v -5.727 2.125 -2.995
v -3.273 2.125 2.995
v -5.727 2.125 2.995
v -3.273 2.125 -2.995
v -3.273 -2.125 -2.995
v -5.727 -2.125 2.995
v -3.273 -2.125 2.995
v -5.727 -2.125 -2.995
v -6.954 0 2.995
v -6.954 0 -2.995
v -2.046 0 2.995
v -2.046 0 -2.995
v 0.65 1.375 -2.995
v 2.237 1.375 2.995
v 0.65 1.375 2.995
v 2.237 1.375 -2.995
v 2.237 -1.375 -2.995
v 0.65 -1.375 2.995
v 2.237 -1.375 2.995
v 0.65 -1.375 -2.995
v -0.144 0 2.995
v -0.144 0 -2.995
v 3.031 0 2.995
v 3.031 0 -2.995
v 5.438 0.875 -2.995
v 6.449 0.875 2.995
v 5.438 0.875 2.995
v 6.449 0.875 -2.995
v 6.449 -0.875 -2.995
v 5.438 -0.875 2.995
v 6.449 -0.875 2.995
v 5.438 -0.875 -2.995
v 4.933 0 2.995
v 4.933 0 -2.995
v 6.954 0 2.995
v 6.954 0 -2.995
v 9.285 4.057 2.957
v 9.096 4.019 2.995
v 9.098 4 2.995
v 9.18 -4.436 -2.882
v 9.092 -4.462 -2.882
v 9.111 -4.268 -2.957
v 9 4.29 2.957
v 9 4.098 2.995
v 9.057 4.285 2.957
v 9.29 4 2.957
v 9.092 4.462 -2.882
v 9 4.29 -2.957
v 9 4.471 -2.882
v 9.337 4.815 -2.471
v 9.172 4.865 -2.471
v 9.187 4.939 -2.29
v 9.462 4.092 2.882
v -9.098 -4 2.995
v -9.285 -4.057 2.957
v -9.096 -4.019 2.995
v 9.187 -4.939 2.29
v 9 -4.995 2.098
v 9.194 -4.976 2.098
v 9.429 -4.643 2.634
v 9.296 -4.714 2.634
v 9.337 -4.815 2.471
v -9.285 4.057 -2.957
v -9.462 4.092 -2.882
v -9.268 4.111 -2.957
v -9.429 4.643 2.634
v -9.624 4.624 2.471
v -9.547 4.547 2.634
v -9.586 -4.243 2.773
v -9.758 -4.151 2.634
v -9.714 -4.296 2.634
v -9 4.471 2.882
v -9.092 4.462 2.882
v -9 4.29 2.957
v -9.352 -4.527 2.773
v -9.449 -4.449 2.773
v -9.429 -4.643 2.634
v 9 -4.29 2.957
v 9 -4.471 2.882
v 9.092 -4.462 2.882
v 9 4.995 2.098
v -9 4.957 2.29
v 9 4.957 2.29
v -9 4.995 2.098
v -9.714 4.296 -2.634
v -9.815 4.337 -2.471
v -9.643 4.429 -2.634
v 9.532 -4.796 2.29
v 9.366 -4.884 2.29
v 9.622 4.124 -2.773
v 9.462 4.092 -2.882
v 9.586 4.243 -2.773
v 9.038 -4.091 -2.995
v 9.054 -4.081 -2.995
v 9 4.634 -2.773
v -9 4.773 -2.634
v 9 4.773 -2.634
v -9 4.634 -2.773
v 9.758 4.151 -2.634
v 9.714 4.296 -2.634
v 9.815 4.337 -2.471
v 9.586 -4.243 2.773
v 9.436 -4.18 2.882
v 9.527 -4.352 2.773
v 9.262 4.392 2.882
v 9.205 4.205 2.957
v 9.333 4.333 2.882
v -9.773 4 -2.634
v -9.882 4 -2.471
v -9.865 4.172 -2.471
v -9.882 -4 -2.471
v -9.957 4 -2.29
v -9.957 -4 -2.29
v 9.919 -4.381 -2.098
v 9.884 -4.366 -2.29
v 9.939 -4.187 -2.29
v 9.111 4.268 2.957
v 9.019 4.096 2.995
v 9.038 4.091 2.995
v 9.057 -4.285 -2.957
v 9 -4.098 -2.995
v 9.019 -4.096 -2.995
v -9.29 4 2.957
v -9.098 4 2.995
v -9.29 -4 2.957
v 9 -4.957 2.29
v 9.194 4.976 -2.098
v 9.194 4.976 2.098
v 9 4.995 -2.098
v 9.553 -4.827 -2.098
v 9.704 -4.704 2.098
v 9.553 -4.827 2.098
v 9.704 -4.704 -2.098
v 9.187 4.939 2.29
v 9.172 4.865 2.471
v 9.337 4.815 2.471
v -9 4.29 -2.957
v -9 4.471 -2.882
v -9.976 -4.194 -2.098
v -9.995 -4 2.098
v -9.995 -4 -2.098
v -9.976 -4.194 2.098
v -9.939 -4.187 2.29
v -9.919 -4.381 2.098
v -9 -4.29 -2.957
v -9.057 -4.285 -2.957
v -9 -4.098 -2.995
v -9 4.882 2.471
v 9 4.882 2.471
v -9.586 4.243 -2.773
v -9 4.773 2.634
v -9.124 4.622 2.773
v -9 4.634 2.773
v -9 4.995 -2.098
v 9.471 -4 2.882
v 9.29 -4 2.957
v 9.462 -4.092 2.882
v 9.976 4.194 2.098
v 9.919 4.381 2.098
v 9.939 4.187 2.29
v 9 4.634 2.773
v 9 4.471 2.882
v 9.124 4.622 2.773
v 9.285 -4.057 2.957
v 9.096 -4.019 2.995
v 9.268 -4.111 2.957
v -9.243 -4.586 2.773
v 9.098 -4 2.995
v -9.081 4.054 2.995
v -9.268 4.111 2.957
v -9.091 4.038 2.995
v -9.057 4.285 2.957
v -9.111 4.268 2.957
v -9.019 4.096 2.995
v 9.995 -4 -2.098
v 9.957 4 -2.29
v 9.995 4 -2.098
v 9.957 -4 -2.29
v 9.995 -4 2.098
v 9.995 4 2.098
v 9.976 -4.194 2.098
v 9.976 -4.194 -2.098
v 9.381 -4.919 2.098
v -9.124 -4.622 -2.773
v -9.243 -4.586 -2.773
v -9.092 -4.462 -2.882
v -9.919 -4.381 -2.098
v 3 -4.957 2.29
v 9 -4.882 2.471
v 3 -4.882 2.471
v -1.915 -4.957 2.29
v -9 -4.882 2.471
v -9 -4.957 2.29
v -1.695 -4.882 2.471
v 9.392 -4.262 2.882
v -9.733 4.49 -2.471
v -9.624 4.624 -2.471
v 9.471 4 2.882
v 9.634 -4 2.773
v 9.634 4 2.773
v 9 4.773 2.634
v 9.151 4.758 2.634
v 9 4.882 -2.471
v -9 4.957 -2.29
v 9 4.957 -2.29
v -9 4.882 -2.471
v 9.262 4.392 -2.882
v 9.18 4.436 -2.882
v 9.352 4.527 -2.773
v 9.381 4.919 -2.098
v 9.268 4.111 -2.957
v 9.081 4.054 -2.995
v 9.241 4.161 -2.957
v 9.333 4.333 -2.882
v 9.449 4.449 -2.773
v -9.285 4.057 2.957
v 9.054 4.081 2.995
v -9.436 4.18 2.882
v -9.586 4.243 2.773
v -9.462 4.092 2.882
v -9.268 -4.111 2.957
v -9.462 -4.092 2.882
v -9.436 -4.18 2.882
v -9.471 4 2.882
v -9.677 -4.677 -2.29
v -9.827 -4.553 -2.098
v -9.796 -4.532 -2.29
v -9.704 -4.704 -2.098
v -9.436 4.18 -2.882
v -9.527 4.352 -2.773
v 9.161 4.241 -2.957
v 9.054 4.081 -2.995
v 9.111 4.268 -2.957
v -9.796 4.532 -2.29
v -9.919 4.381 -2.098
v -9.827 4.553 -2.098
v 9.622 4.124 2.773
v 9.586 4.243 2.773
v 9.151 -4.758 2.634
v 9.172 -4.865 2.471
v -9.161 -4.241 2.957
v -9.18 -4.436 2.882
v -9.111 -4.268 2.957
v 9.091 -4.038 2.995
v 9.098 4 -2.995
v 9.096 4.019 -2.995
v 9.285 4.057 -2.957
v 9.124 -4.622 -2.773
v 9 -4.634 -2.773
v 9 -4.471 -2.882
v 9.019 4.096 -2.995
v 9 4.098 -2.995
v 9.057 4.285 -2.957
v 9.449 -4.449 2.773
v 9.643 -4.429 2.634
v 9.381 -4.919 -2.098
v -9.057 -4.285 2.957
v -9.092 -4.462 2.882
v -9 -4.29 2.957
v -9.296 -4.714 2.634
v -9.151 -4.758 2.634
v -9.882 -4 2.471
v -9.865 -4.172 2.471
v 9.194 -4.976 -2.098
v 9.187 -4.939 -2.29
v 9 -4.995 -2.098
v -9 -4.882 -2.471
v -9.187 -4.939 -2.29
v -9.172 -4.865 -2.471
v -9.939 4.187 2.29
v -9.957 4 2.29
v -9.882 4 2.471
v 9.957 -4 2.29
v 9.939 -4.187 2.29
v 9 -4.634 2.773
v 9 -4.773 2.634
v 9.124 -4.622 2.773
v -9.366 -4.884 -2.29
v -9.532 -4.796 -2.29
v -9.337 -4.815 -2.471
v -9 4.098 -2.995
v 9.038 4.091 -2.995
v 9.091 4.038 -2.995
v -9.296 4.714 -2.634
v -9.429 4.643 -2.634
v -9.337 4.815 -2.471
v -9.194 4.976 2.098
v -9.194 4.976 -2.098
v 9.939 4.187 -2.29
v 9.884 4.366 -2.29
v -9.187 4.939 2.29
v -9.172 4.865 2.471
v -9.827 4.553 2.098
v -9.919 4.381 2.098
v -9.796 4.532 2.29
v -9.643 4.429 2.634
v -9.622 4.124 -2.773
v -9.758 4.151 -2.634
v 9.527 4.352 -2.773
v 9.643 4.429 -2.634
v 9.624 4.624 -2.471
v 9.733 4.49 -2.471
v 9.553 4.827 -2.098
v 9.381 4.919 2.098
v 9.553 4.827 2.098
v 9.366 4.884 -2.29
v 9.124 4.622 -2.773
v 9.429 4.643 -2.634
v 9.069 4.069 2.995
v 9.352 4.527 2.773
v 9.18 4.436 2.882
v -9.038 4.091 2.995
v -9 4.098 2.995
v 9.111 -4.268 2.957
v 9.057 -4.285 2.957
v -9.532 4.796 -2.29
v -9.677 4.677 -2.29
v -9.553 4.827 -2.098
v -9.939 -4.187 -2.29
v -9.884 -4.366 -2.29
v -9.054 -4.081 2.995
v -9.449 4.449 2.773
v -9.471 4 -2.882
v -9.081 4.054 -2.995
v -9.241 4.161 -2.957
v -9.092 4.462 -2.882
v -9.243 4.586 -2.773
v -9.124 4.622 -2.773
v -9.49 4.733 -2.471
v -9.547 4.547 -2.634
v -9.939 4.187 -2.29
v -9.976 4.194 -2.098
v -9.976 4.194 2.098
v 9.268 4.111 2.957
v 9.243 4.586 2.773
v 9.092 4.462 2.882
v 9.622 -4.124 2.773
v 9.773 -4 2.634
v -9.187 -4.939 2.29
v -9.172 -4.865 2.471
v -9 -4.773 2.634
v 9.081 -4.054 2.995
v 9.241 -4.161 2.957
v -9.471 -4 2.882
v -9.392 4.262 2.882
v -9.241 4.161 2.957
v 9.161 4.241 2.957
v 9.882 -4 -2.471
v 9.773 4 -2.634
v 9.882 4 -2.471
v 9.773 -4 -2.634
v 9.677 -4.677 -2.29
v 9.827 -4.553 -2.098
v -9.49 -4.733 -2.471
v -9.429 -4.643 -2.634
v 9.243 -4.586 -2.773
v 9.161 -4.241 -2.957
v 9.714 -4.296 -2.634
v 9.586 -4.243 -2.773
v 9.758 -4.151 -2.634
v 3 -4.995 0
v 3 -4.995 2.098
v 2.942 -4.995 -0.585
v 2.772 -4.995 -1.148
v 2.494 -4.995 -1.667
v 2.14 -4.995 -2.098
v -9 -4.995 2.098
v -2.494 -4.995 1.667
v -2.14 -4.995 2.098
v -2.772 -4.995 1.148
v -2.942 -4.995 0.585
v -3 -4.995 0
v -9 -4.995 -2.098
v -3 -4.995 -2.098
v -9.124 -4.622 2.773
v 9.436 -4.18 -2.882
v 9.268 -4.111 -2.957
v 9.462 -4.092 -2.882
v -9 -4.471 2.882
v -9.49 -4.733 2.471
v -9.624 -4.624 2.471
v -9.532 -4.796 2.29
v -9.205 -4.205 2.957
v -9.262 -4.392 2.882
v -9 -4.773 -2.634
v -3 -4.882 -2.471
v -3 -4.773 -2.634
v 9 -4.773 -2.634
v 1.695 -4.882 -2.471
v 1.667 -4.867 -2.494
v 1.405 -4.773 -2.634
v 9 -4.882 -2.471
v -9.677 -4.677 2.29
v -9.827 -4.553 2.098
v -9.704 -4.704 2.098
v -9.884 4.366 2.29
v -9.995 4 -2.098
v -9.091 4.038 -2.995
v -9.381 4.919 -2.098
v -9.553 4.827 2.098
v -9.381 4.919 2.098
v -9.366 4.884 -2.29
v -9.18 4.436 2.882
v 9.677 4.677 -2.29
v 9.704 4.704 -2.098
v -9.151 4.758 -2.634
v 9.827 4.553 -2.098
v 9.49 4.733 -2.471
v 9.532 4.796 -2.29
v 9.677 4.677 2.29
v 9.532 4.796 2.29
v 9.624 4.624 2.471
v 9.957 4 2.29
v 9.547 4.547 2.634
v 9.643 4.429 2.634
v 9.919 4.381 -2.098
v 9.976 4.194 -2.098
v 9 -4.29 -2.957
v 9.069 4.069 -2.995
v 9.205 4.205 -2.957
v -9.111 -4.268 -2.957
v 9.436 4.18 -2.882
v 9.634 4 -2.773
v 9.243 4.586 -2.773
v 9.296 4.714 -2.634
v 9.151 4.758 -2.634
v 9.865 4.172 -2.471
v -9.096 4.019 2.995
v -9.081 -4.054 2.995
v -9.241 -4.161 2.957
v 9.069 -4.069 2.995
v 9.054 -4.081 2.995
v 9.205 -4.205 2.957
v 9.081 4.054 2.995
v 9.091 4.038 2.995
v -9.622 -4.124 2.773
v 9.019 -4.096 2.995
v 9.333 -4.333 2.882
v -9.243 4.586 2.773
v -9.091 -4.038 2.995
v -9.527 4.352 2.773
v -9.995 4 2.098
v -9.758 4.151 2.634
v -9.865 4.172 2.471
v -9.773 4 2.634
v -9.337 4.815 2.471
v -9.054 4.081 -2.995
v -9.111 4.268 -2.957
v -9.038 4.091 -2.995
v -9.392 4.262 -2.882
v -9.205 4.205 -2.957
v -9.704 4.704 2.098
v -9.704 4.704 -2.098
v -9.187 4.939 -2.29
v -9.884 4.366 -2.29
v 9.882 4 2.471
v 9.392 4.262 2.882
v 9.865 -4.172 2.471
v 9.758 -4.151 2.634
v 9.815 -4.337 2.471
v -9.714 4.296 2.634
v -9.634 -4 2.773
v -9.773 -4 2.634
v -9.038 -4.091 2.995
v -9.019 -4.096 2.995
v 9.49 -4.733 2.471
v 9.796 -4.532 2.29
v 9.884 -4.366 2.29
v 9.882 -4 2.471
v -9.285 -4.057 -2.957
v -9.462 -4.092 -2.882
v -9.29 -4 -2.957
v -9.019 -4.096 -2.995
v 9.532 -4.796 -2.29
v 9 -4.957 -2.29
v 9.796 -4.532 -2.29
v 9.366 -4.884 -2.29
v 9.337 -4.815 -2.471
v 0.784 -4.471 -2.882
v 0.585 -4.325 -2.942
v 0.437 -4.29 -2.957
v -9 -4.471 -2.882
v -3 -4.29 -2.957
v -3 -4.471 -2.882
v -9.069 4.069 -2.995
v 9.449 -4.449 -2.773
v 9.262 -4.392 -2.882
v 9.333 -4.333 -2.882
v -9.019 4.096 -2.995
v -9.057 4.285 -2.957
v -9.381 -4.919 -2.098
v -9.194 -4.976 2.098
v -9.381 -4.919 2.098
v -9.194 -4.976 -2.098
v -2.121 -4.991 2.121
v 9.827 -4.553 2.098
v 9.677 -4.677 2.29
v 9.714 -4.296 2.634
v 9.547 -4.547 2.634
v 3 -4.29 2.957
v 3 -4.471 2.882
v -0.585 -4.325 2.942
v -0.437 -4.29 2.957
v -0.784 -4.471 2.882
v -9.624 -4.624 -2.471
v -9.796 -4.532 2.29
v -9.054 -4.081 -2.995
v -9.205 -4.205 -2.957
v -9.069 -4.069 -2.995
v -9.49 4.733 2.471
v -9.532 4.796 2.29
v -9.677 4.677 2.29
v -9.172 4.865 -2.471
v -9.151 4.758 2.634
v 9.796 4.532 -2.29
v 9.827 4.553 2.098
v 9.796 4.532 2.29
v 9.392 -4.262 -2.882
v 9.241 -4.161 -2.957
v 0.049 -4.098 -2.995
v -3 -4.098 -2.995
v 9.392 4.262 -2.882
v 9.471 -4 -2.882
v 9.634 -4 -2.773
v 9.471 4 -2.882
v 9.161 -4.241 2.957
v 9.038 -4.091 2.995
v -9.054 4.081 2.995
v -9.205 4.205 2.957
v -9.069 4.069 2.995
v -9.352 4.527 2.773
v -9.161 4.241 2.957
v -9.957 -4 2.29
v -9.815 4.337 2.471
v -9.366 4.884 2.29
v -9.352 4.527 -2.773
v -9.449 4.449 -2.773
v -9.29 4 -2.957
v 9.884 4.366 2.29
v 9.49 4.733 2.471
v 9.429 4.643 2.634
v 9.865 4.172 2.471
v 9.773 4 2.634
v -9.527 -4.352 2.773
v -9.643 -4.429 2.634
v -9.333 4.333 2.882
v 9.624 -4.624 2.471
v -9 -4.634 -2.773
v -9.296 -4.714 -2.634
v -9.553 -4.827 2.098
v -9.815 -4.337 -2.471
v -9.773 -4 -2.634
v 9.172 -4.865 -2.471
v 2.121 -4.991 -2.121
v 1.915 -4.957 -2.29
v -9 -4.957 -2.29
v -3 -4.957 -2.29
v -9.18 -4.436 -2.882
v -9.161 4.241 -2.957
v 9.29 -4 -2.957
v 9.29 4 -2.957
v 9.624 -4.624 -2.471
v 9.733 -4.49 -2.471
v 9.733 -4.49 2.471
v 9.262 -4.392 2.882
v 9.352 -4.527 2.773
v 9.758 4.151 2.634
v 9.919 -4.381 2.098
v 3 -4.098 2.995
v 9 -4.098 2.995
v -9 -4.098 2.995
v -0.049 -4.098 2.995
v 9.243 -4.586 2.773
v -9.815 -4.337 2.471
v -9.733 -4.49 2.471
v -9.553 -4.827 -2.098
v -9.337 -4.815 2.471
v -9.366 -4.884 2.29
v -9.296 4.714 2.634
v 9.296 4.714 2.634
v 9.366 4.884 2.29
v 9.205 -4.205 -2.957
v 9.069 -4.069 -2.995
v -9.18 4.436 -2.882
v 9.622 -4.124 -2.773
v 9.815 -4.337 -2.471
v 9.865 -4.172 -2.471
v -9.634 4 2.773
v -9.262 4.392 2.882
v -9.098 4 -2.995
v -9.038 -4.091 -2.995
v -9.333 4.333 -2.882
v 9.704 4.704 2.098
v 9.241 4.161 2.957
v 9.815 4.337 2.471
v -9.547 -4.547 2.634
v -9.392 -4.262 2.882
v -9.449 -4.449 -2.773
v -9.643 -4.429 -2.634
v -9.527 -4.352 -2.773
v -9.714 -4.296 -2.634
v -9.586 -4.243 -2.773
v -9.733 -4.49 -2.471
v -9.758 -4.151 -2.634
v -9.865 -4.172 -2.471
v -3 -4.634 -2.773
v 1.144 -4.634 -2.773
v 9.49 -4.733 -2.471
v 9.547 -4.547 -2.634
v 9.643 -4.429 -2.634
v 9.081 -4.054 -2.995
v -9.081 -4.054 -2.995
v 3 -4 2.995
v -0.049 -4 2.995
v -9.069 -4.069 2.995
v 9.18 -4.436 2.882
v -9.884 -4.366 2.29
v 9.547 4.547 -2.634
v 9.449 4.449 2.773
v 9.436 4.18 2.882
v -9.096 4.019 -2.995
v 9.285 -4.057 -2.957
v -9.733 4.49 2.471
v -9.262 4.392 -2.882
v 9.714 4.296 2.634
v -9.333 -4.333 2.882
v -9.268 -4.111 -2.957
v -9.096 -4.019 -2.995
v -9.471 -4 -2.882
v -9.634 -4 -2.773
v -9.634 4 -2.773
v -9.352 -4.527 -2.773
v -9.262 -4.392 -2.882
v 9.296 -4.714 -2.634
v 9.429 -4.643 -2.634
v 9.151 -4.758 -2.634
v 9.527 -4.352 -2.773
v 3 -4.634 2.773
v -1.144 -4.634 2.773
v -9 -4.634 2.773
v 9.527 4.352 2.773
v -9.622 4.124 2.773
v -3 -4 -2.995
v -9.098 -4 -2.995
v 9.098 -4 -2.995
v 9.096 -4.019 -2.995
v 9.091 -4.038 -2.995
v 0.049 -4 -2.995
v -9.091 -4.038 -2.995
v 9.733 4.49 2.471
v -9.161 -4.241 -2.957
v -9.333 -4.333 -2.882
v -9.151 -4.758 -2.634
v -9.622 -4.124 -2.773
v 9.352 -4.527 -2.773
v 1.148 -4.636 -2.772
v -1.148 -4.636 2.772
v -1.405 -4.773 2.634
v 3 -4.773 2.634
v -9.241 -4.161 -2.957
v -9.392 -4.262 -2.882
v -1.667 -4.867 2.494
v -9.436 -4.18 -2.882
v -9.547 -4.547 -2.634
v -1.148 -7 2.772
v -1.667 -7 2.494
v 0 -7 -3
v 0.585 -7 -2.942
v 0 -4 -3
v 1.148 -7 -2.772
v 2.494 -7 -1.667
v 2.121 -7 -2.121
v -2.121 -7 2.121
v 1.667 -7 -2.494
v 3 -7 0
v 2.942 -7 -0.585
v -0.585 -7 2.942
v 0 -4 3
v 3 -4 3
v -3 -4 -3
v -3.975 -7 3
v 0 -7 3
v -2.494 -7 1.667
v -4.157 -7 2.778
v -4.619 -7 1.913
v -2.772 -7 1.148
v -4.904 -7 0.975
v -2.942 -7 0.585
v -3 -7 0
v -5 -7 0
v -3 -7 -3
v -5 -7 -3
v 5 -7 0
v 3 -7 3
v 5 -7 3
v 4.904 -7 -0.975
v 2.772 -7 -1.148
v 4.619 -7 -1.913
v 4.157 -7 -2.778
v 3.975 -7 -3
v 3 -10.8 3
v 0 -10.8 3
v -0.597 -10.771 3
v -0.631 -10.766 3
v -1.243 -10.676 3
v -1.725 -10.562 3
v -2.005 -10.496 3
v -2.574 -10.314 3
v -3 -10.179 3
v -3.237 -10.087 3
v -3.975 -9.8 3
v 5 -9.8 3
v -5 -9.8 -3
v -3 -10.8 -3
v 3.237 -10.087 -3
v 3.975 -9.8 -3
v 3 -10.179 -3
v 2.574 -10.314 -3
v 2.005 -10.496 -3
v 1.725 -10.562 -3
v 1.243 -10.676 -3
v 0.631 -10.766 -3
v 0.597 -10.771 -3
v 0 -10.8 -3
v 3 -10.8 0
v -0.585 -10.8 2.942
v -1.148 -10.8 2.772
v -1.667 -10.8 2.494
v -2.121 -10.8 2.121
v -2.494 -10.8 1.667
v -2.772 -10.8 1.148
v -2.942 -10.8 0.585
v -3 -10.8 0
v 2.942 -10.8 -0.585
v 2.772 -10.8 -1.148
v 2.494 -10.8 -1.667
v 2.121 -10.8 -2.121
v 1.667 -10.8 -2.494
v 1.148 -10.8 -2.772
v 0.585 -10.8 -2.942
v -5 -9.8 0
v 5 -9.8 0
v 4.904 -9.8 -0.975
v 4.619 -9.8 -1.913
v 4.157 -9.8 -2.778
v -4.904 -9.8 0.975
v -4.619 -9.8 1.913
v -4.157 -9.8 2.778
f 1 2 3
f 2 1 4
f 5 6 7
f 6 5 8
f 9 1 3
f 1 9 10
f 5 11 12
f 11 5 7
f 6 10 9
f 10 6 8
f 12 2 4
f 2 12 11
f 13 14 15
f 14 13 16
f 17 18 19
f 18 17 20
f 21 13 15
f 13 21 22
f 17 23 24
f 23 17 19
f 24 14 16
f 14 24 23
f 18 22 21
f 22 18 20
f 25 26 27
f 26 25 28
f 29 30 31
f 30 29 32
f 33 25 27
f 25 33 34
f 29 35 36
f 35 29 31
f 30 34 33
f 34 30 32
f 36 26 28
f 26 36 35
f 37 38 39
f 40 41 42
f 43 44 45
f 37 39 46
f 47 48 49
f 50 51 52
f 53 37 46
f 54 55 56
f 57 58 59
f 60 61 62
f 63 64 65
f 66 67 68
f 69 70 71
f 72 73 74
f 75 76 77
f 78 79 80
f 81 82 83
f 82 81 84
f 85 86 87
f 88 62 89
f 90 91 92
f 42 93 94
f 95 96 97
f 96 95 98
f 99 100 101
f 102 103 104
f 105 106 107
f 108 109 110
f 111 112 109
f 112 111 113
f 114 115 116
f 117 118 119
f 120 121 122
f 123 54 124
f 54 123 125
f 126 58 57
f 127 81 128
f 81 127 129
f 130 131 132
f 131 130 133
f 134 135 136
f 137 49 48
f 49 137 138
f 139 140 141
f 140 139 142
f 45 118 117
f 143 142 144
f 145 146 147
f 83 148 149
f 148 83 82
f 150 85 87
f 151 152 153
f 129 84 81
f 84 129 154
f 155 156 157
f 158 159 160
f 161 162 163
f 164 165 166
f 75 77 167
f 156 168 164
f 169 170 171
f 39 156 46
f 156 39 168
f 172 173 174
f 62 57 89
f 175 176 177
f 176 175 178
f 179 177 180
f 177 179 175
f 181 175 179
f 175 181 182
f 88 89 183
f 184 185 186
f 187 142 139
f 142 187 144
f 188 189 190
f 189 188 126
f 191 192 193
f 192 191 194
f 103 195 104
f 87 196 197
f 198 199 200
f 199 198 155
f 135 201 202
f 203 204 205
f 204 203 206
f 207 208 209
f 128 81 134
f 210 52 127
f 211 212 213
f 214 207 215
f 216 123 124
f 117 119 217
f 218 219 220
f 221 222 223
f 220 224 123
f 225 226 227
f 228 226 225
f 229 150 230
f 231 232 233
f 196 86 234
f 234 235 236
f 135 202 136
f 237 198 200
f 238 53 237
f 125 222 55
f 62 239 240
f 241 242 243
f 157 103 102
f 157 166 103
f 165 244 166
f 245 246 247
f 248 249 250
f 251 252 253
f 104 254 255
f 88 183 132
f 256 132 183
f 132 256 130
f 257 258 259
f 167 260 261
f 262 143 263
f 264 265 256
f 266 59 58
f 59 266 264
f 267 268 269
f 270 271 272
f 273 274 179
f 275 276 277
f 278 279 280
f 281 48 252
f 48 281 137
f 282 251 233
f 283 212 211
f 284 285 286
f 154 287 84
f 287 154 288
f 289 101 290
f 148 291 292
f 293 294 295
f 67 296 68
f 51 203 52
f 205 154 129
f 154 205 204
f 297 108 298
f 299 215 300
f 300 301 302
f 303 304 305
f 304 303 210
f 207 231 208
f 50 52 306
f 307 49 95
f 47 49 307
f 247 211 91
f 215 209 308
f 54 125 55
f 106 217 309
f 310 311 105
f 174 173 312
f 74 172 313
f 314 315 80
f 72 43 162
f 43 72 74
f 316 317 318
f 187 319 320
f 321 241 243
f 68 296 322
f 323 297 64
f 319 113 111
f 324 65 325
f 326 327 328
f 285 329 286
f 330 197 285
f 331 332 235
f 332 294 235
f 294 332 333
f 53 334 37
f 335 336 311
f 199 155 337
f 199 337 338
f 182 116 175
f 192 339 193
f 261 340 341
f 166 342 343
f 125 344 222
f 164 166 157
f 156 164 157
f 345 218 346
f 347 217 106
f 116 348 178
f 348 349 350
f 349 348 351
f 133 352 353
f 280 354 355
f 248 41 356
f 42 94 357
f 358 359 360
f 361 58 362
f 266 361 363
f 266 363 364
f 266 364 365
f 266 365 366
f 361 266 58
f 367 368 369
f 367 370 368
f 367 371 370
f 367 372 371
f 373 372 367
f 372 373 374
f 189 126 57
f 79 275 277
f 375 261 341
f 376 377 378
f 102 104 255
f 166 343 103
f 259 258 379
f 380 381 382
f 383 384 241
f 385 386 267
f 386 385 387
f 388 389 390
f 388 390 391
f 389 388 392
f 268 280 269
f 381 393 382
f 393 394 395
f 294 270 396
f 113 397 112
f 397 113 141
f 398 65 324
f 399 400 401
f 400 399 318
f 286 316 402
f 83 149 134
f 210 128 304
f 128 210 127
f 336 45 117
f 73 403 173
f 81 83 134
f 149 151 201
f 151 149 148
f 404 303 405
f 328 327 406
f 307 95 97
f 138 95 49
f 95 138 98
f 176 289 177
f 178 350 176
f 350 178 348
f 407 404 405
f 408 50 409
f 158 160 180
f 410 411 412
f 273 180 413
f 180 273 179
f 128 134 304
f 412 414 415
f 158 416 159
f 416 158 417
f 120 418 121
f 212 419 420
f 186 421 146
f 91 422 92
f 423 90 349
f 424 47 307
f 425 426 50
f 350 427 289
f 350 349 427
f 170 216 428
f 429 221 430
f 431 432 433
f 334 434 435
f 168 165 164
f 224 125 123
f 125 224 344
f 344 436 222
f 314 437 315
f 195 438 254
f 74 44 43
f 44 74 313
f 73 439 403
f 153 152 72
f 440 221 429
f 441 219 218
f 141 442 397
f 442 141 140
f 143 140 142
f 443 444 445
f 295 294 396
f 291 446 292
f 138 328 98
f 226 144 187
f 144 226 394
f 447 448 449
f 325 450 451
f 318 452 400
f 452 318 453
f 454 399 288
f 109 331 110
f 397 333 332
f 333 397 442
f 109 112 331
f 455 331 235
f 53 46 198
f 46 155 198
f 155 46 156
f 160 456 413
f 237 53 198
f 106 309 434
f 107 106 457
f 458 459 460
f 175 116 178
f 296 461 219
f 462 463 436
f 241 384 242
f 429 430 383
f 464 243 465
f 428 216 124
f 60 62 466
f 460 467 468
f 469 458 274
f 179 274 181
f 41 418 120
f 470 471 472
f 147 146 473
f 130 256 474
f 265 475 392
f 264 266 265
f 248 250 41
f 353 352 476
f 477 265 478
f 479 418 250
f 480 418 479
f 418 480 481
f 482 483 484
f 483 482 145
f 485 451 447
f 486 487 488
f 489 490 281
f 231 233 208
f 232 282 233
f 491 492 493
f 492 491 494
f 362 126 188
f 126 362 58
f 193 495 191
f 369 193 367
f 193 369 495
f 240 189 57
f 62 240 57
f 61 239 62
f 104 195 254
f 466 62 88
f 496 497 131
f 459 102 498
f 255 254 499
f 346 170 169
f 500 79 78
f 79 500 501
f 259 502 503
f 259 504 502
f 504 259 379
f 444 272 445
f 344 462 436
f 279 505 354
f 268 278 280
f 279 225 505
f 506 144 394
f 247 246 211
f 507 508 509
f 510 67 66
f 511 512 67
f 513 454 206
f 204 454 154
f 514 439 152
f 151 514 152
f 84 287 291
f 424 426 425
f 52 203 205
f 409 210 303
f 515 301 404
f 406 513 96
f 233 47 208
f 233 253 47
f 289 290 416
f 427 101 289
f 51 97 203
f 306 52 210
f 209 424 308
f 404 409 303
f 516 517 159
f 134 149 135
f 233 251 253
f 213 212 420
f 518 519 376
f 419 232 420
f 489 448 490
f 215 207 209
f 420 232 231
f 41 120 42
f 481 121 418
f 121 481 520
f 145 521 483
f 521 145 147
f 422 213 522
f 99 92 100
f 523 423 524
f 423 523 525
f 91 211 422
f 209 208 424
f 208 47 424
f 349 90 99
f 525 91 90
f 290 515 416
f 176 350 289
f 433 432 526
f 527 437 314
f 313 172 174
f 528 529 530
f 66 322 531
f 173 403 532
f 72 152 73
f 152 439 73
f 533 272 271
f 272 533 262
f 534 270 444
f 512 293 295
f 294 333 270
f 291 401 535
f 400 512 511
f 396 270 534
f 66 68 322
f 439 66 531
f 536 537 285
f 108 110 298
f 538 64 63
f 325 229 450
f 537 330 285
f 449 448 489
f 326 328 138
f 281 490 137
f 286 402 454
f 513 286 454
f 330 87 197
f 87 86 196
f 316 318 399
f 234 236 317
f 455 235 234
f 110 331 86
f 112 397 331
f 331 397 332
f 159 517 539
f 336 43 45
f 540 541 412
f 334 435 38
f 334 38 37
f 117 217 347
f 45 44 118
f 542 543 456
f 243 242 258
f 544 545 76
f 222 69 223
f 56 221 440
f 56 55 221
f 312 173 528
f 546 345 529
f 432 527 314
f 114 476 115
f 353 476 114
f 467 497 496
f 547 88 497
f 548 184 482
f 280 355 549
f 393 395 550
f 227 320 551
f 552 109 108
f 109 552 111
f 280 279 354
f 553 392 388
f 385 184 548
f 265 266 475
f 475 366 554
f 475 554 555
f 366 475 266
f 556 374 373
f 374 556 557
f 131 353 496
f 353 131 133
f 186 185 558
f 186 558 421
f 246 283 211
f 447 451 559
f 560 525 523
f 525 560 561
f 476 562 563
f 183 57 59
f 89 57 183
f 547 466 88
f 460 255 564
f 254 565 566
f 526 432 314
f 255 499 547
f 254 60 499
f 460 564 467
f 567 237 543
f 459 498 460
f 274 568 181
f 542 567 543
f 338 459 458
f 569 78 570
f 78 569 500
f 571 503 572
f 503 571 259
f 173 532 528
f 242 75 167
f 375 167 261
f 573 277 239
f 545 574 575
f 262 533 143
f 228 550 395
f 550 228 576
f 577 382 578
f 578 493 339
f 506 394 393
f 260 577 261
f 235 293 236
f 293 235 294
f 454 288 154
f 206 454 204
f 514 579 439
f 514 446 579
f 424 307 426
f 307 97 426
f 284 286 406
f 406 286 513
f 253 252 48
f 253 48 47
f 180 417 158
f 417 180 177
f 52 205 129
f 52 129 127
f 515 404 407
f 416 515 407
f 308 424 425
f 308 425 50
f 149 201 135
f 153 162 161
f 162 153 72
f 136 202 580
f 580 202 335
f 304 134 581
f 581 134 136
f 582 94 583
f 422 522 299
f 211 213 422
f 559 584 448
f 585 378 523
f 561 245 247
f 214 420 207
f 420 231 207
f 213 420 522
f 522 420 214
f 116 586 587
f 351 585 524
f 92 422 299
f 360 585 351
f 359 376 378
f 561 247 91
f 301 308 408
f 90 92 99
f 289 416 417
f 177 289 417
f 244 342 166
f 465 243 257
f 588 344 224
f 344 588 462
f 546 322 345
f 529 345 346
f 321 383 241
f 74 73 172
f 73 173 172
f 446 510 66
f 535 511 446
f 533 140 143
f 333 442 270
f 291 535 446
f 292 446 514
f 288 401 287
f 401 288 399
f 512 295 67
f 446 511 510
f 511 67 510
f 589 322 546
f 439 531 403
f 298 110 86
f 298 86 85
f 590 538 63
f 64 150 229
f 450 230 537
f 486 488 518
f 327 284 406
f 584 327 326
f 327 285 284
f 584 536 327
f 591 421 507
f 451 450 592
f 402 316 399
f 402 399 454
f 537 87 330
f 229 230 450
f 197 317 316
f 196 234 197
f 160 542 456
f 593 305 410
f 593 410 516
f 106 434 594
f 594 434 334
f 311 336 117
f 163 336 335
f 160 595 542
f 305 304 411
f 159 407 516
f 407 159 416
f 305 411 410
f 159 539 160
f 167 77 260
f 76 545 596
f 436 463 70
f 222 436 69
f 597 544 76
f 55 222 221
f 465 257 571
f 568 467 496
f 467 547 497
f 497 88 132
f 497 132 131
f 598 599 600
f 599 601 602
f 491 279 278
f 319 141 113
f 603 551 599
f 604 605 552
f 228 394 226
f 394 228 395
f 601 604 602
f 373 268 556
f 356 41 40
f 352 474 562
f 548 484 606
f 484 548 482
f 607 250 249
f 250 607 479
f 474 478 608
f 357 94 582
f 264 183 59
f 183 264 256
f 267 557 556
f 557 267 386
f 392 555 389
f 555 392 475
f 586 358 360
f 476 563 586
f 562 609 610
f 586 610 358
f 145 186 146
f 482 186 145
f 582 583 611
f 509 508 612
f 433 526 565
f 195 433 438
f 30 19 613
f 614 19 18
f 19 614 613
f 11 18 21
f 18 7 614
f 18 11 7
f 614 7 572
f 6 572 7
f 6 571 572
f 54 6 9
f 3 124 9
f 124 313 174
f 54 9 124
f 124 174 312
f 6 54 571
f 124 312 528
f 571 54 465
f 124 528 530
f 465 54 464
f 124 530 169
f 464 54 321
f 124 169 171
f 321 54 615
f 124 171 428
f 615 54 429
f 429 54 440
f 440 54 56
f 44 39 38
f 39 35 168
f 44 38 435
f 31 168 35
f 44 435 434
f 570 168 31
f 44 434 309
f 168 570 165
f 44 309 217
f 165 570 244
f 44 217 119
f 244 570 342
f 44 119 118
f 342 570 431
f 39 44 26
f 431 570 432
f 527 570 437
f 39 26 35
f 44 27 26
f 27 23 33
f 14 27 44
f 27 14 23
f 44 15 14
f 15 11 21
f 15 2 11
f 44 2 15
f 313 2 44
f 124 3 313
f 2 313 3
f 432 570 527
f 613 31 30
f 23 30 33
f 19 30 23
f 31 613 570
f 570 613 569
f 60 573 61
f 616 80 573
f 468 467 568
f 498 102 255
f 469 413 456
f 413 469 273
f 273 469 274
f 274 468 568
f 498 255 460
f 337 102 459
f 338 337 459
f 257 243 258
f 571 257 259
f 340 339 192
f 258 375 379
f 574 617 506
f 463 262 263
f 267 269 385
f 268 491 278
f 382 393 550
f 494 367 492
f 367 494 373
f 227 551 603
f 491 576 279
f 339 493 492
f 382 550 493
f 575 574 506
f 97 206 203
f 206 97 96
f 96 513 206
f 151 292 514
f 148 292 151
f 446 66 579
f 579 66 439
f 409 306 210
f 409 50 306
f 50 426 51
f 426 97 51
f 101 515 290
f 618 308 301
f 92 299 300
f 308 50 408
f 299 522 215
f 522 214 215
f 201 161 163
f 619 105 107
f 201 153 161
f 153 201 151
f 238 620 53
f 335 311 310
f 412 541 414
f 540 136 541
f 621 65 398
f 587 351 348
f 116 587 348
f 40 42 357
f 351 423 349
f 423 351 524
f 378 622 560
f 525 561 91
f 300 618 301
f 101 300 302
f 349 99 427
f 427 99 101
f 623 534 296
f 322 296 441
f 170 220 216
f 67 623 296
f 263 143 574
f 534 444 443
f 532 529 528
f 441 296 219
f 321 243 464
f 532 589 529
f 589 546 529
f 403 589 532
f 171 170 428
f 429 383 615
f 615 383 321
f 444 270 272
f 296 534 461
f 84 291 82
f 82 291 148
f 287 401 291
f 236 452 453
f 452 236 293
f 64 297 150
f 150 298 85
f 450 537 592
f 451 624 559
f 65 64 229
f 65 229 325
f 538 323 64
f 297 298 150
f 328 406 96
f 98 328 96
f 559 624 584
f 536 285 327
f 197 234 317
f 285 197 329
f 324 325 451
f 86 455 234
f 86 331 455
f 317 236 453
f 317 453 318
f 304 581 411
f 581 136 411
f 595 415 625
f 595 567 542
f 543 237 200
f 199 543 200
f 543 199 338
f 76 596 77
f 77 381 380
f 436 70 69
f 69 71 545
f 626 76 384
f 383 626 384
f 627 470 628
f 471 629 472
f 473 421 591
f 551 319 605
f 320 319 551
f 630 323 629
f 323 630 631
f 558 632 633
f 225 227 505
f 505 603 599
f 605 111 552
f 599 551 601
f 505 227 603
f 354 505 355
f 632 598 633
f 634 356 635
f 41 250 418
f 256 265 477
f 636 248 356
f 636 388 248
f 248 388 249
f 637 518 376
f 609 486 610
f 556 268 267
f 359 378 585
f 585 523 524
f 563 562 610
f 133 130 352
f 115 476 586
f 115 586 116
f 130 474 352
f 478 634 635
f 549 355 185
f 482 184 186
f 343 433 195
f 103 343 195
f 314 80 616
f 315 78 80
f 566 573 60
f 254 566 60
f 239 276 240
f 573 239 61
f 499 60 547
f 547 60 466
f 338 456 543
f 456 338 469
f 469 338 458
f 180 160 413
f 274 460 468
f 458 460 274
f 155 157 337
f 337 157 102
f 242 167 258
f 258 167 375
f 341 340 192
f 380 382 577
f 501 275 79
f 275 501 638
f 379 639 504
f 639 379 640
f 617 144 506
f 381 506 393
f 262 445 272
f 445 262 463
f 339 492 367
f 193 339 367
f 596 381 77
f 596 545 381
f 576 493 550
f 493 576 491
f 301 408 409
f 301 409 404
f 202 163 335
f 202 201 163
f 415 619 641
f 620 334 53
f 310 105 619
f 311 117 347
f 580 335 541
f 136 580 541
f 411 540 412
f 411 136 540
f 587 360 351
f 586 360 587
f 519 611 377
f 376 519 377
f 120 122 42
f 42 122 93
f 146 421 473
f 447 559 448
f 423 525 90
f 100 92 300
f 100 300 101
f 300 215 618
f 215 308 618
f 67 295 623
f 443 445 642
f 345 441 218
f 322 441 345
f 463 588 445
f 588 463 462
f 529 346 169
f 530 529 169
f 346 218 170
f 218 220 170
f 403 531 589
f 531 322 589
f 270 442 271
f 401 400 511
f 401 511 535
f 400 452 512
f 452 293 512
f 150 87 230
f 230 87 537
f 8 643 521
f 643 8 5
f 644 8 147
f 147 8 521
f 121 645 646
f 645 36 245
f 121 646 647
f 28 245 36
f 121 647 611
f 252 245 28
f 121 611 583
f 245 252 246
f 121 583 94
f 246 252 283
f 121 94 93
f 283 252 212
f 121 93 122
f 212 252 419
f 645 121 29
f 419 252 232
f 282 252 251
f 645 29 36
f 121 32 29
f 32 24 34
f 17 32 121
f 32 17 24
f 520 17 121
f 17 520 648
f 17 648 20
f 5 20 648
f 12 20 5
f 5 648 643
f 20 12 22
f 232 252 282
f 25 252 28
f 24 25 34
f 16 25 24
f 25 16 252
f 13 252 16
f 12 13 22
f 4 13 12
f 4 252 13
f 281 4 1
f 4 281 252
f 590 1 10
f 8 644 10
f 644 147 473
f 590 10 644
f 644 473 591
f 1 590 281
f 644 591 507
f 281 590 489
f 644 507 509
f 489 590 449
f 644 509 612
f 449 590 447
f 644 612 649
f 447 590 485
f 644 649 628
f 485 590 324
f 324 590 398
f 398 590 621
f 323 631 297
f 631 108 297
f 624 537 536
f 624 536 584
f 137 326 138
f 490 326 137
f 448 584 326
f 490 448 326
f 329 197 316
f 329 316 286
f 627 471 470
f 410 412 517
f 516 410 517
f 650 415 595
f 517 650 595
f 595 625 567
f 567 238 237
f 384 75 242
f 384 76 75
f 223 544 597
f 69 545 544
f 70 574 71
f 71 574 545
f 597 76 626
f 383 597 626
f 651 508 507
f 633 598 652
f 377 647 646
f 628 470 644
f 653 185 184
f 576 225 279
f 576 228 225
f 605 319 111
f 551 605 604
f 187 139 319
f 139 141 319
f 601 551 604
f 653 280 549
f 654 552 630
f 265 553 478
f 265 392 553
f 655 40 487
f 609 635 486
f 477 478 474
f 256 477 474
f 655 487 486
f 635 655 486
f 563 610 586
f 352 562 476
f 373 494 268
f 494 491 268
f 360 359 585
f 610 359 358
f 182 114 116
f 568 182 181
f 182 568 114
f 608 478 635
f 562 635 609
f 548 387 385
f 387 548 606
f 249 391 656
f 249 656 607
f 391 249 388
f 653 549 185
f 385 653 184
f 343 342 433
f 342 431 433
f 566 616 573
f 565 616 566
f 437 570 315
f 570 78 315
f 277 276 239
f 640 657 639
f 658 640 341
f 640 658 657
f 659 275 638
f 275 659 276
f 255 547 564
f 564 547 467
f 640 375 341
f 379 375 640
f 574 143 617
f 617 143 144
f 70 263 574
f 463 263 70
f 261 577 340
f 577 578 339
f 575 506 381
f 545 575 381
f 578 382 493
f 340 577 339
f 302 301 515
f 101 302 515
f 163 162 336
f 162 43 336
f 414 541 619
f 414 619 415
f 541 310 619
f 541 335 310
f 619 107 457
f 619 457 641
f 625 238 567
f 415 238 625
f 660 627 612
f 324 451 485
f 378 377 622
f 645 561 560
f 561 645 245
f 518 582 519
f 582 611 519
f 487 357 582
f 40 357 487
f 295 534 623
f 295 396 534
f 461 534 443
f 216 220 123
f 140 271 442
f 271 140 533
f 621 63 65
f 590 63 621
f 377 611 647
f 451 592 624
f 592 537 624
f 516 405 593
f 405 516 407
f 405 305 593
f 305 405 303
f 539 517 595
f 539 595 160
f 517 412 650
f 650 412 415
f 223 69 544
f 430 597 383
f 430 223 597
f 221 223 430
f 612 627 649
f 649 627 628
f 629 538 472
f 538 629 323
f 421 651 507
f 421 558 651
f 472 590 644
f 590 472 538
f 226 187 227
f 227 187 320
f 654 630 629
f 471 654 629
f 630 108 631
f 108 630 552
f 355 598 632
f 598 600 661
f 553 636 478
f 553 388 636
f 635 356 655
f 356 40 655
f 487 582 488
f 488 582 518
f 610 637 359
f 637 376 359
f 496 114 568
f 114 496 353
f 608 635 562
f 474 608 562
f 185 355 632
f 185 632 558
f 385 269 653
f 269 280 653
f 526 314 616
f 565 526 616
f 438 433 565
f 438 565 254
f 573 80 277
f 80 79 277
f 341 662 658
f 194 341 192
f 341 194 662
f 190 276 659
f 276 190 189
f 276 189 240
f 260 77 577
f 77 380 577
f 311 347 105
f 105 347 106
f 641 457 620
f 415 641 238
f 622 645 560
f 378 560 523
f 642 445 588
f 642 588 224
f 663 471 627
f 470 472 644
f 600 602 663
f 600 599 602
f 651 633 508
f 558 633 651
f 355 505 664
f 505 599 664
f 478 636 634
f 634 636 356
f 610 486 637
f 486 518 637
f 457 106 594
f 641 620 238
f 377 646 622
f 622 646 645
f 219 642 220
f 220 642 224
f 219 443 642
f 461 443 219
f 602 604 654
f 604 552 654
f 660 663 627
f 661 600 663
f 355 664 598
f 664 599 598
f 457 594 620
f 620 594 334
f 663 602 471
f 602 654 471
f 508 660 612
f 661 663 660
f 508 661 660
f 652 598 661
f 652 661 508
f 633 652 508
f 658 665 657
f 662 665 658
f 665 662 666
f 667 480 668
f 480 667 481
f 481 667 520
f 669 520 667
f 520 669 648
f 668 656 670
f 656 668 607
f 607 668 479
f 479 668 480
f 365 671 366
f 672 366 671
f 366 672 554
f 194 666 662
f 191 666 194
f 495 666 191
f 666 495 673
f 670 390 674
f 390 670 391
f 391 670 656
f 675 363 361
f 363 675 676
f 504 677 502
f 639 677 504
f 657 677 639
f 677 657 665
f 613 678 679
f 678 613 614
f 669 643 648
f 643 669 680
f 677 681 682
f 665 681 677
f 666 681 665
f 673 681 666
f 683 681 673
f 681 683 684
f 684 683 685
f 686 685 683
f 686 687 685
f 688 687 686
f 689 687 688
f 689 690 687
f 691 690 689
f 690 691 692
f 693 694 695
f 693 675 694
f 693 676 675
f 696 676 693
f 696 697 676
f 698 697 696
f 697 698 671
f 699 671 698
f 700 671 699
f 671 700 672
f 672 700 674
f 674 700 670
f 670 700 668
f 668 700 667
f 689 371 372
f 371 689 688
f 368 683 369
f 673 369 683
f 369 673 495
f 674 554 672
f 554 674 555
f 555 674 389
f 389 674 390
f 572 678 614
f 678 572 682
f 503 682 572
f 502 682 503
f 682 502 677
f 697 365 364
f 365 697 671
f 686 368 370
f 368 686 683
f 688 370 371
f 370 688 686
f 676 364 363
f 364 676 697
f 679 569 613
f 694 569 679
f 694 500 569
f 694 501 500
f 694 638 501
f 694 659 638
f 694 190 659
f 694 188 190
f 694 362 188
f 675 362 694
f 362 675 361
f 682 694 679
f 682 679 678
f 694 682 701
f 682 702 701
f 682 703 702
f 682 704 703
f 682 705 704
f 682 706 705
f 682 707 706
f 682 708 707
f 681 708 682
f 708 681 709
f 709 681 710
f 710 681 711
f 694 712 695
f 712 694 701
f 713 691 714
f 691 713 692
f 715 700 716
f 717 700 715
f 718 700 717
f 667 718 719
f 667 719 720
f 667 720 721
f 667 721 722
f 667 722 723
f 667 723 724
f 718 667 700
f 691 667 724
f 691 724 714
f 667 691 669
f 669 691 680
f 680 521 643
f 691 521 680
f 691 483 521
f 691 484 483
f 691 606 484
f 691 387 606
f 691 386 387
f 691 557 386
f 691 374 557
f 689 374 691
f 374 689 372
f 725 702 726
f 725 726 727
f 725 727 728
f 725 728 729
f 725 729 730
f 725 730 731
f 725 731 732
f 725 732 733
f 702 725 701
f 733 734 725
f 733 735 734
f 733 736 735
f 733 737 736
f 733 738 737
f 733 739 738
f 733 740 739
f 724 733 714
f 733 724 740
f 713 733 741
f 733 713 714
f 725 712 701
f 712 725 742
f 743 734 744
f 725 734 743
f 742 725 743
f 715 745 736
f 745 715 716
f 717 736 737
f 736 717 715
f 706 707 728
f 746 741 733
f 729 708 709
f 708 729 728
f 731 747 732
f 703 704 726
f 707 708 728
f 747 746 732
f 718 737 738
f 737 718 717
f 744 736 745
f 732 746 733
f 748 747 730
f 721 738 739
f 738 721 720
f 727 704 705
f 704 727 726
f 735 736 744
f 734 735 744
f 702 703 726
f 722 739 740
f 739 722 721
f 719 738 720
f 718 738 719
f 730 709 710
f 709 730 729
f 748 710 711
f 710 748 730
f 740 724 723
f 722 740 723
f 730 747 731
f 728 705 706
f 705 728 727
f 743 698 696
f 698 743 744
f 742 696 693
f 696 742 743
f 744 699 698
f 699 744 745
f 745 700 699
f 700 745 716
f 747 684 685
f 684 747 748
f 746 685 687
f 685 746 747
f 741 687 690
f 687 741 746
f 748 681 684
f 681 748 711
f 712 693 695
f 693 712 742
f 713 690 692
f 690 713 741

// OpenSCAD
// Customizable hex key holder

// diameter for key #1
hex1 = 4; // [1.5:0.5:5]

// diameter for key #2 
hex2 = 2.5; //[1.5:0.5:5]

// diameter for key #3
hex3 = 1.5; //[1.5:0.5:5]

// tolerance for the print
tolerance = 0.25;

/*[Hidden]*/
$fn=32;


// Lets build it
block();

module hexHole(h){
    h = h+tolerance;
    face = (h)/sqrt(3);
    
    color("red")
    union(){
        cube([h/sqrt(3),h,8], center = true);
        rotate(60) cube([face,h,8], center = true);
        rotate(120) cube([face,h,8], center = true);
    }
}

function d(h=5) = 2*h/sqrt(3);

module hexHoles(){
    space = (18-d(hex1)-d(hex2)-d(hex3))/4;

    translate([-9+space+d(hex1)/2,0,0])
    hexHole(hex1);

    translate([-9+2*space+d(hex1)+d(hex2)/2,0,0])
    hexHole(hex2);

    translate([-9+3*space+d(hex1)+d(hex2)+d(hex3)/2,0,0])
    hexHole(hex3);
}


module block(){
    union(){
        // BODY
        difference(){
            minkowski(){
                sphere(1);
                
                translate([0,0,0])
                cube([18,8,4], center = true);
            }
            
            hexHoles();
        }
        // NECK
        union(){
            translate([0,-5.5,0]) 
            rotate([90,0,0]) 
            cylinder(h=3, r=3, center=true);
            
            translate([0,-7,0]) 
            cube([3, 3,3], center = false);

            translate([-3,-7,-3]) 
            cube([3,3,3], center = false);

        }
        // HEAD
        intersection(){
            union(){
                translate([0,-9.8,0]) 
                rotate([-90,0,0]) 
                cylinder(h=2.8, r=5, center=false);
                
                translate([0,-9.8,0]) 
                cube([5, 2.8,5], center = false);

                translate([-5,-9.8,-5])  
                cube([5, 2.8,5], center = false);
                
                union(){
                    intersection(){
                        translate([0,-9.8,0])
                        rotate([90,0,0])
                        linear_extrude(height = 1, scale = 0.6)
                        square([10, 10], center = true);
                        
                        union(){
                            translate([0,-10.8,0])
                            cube([5, 1,5], center=false);
                            
                            translate([-5,-10.8,-5])
                            cube([5,1,5], center=false);
                        }
                    }
                    translate([0,-9.8,0])
                    rotate([90,0,0])
                    linear_extrude(height = 1, scale = 0.6)
                    circle(5, center = true);
                }
            }

            translate([-5,-10.8,-3])
            cube([10,3.8,6], center = false);
        }
    }
}
echo(version=version());
